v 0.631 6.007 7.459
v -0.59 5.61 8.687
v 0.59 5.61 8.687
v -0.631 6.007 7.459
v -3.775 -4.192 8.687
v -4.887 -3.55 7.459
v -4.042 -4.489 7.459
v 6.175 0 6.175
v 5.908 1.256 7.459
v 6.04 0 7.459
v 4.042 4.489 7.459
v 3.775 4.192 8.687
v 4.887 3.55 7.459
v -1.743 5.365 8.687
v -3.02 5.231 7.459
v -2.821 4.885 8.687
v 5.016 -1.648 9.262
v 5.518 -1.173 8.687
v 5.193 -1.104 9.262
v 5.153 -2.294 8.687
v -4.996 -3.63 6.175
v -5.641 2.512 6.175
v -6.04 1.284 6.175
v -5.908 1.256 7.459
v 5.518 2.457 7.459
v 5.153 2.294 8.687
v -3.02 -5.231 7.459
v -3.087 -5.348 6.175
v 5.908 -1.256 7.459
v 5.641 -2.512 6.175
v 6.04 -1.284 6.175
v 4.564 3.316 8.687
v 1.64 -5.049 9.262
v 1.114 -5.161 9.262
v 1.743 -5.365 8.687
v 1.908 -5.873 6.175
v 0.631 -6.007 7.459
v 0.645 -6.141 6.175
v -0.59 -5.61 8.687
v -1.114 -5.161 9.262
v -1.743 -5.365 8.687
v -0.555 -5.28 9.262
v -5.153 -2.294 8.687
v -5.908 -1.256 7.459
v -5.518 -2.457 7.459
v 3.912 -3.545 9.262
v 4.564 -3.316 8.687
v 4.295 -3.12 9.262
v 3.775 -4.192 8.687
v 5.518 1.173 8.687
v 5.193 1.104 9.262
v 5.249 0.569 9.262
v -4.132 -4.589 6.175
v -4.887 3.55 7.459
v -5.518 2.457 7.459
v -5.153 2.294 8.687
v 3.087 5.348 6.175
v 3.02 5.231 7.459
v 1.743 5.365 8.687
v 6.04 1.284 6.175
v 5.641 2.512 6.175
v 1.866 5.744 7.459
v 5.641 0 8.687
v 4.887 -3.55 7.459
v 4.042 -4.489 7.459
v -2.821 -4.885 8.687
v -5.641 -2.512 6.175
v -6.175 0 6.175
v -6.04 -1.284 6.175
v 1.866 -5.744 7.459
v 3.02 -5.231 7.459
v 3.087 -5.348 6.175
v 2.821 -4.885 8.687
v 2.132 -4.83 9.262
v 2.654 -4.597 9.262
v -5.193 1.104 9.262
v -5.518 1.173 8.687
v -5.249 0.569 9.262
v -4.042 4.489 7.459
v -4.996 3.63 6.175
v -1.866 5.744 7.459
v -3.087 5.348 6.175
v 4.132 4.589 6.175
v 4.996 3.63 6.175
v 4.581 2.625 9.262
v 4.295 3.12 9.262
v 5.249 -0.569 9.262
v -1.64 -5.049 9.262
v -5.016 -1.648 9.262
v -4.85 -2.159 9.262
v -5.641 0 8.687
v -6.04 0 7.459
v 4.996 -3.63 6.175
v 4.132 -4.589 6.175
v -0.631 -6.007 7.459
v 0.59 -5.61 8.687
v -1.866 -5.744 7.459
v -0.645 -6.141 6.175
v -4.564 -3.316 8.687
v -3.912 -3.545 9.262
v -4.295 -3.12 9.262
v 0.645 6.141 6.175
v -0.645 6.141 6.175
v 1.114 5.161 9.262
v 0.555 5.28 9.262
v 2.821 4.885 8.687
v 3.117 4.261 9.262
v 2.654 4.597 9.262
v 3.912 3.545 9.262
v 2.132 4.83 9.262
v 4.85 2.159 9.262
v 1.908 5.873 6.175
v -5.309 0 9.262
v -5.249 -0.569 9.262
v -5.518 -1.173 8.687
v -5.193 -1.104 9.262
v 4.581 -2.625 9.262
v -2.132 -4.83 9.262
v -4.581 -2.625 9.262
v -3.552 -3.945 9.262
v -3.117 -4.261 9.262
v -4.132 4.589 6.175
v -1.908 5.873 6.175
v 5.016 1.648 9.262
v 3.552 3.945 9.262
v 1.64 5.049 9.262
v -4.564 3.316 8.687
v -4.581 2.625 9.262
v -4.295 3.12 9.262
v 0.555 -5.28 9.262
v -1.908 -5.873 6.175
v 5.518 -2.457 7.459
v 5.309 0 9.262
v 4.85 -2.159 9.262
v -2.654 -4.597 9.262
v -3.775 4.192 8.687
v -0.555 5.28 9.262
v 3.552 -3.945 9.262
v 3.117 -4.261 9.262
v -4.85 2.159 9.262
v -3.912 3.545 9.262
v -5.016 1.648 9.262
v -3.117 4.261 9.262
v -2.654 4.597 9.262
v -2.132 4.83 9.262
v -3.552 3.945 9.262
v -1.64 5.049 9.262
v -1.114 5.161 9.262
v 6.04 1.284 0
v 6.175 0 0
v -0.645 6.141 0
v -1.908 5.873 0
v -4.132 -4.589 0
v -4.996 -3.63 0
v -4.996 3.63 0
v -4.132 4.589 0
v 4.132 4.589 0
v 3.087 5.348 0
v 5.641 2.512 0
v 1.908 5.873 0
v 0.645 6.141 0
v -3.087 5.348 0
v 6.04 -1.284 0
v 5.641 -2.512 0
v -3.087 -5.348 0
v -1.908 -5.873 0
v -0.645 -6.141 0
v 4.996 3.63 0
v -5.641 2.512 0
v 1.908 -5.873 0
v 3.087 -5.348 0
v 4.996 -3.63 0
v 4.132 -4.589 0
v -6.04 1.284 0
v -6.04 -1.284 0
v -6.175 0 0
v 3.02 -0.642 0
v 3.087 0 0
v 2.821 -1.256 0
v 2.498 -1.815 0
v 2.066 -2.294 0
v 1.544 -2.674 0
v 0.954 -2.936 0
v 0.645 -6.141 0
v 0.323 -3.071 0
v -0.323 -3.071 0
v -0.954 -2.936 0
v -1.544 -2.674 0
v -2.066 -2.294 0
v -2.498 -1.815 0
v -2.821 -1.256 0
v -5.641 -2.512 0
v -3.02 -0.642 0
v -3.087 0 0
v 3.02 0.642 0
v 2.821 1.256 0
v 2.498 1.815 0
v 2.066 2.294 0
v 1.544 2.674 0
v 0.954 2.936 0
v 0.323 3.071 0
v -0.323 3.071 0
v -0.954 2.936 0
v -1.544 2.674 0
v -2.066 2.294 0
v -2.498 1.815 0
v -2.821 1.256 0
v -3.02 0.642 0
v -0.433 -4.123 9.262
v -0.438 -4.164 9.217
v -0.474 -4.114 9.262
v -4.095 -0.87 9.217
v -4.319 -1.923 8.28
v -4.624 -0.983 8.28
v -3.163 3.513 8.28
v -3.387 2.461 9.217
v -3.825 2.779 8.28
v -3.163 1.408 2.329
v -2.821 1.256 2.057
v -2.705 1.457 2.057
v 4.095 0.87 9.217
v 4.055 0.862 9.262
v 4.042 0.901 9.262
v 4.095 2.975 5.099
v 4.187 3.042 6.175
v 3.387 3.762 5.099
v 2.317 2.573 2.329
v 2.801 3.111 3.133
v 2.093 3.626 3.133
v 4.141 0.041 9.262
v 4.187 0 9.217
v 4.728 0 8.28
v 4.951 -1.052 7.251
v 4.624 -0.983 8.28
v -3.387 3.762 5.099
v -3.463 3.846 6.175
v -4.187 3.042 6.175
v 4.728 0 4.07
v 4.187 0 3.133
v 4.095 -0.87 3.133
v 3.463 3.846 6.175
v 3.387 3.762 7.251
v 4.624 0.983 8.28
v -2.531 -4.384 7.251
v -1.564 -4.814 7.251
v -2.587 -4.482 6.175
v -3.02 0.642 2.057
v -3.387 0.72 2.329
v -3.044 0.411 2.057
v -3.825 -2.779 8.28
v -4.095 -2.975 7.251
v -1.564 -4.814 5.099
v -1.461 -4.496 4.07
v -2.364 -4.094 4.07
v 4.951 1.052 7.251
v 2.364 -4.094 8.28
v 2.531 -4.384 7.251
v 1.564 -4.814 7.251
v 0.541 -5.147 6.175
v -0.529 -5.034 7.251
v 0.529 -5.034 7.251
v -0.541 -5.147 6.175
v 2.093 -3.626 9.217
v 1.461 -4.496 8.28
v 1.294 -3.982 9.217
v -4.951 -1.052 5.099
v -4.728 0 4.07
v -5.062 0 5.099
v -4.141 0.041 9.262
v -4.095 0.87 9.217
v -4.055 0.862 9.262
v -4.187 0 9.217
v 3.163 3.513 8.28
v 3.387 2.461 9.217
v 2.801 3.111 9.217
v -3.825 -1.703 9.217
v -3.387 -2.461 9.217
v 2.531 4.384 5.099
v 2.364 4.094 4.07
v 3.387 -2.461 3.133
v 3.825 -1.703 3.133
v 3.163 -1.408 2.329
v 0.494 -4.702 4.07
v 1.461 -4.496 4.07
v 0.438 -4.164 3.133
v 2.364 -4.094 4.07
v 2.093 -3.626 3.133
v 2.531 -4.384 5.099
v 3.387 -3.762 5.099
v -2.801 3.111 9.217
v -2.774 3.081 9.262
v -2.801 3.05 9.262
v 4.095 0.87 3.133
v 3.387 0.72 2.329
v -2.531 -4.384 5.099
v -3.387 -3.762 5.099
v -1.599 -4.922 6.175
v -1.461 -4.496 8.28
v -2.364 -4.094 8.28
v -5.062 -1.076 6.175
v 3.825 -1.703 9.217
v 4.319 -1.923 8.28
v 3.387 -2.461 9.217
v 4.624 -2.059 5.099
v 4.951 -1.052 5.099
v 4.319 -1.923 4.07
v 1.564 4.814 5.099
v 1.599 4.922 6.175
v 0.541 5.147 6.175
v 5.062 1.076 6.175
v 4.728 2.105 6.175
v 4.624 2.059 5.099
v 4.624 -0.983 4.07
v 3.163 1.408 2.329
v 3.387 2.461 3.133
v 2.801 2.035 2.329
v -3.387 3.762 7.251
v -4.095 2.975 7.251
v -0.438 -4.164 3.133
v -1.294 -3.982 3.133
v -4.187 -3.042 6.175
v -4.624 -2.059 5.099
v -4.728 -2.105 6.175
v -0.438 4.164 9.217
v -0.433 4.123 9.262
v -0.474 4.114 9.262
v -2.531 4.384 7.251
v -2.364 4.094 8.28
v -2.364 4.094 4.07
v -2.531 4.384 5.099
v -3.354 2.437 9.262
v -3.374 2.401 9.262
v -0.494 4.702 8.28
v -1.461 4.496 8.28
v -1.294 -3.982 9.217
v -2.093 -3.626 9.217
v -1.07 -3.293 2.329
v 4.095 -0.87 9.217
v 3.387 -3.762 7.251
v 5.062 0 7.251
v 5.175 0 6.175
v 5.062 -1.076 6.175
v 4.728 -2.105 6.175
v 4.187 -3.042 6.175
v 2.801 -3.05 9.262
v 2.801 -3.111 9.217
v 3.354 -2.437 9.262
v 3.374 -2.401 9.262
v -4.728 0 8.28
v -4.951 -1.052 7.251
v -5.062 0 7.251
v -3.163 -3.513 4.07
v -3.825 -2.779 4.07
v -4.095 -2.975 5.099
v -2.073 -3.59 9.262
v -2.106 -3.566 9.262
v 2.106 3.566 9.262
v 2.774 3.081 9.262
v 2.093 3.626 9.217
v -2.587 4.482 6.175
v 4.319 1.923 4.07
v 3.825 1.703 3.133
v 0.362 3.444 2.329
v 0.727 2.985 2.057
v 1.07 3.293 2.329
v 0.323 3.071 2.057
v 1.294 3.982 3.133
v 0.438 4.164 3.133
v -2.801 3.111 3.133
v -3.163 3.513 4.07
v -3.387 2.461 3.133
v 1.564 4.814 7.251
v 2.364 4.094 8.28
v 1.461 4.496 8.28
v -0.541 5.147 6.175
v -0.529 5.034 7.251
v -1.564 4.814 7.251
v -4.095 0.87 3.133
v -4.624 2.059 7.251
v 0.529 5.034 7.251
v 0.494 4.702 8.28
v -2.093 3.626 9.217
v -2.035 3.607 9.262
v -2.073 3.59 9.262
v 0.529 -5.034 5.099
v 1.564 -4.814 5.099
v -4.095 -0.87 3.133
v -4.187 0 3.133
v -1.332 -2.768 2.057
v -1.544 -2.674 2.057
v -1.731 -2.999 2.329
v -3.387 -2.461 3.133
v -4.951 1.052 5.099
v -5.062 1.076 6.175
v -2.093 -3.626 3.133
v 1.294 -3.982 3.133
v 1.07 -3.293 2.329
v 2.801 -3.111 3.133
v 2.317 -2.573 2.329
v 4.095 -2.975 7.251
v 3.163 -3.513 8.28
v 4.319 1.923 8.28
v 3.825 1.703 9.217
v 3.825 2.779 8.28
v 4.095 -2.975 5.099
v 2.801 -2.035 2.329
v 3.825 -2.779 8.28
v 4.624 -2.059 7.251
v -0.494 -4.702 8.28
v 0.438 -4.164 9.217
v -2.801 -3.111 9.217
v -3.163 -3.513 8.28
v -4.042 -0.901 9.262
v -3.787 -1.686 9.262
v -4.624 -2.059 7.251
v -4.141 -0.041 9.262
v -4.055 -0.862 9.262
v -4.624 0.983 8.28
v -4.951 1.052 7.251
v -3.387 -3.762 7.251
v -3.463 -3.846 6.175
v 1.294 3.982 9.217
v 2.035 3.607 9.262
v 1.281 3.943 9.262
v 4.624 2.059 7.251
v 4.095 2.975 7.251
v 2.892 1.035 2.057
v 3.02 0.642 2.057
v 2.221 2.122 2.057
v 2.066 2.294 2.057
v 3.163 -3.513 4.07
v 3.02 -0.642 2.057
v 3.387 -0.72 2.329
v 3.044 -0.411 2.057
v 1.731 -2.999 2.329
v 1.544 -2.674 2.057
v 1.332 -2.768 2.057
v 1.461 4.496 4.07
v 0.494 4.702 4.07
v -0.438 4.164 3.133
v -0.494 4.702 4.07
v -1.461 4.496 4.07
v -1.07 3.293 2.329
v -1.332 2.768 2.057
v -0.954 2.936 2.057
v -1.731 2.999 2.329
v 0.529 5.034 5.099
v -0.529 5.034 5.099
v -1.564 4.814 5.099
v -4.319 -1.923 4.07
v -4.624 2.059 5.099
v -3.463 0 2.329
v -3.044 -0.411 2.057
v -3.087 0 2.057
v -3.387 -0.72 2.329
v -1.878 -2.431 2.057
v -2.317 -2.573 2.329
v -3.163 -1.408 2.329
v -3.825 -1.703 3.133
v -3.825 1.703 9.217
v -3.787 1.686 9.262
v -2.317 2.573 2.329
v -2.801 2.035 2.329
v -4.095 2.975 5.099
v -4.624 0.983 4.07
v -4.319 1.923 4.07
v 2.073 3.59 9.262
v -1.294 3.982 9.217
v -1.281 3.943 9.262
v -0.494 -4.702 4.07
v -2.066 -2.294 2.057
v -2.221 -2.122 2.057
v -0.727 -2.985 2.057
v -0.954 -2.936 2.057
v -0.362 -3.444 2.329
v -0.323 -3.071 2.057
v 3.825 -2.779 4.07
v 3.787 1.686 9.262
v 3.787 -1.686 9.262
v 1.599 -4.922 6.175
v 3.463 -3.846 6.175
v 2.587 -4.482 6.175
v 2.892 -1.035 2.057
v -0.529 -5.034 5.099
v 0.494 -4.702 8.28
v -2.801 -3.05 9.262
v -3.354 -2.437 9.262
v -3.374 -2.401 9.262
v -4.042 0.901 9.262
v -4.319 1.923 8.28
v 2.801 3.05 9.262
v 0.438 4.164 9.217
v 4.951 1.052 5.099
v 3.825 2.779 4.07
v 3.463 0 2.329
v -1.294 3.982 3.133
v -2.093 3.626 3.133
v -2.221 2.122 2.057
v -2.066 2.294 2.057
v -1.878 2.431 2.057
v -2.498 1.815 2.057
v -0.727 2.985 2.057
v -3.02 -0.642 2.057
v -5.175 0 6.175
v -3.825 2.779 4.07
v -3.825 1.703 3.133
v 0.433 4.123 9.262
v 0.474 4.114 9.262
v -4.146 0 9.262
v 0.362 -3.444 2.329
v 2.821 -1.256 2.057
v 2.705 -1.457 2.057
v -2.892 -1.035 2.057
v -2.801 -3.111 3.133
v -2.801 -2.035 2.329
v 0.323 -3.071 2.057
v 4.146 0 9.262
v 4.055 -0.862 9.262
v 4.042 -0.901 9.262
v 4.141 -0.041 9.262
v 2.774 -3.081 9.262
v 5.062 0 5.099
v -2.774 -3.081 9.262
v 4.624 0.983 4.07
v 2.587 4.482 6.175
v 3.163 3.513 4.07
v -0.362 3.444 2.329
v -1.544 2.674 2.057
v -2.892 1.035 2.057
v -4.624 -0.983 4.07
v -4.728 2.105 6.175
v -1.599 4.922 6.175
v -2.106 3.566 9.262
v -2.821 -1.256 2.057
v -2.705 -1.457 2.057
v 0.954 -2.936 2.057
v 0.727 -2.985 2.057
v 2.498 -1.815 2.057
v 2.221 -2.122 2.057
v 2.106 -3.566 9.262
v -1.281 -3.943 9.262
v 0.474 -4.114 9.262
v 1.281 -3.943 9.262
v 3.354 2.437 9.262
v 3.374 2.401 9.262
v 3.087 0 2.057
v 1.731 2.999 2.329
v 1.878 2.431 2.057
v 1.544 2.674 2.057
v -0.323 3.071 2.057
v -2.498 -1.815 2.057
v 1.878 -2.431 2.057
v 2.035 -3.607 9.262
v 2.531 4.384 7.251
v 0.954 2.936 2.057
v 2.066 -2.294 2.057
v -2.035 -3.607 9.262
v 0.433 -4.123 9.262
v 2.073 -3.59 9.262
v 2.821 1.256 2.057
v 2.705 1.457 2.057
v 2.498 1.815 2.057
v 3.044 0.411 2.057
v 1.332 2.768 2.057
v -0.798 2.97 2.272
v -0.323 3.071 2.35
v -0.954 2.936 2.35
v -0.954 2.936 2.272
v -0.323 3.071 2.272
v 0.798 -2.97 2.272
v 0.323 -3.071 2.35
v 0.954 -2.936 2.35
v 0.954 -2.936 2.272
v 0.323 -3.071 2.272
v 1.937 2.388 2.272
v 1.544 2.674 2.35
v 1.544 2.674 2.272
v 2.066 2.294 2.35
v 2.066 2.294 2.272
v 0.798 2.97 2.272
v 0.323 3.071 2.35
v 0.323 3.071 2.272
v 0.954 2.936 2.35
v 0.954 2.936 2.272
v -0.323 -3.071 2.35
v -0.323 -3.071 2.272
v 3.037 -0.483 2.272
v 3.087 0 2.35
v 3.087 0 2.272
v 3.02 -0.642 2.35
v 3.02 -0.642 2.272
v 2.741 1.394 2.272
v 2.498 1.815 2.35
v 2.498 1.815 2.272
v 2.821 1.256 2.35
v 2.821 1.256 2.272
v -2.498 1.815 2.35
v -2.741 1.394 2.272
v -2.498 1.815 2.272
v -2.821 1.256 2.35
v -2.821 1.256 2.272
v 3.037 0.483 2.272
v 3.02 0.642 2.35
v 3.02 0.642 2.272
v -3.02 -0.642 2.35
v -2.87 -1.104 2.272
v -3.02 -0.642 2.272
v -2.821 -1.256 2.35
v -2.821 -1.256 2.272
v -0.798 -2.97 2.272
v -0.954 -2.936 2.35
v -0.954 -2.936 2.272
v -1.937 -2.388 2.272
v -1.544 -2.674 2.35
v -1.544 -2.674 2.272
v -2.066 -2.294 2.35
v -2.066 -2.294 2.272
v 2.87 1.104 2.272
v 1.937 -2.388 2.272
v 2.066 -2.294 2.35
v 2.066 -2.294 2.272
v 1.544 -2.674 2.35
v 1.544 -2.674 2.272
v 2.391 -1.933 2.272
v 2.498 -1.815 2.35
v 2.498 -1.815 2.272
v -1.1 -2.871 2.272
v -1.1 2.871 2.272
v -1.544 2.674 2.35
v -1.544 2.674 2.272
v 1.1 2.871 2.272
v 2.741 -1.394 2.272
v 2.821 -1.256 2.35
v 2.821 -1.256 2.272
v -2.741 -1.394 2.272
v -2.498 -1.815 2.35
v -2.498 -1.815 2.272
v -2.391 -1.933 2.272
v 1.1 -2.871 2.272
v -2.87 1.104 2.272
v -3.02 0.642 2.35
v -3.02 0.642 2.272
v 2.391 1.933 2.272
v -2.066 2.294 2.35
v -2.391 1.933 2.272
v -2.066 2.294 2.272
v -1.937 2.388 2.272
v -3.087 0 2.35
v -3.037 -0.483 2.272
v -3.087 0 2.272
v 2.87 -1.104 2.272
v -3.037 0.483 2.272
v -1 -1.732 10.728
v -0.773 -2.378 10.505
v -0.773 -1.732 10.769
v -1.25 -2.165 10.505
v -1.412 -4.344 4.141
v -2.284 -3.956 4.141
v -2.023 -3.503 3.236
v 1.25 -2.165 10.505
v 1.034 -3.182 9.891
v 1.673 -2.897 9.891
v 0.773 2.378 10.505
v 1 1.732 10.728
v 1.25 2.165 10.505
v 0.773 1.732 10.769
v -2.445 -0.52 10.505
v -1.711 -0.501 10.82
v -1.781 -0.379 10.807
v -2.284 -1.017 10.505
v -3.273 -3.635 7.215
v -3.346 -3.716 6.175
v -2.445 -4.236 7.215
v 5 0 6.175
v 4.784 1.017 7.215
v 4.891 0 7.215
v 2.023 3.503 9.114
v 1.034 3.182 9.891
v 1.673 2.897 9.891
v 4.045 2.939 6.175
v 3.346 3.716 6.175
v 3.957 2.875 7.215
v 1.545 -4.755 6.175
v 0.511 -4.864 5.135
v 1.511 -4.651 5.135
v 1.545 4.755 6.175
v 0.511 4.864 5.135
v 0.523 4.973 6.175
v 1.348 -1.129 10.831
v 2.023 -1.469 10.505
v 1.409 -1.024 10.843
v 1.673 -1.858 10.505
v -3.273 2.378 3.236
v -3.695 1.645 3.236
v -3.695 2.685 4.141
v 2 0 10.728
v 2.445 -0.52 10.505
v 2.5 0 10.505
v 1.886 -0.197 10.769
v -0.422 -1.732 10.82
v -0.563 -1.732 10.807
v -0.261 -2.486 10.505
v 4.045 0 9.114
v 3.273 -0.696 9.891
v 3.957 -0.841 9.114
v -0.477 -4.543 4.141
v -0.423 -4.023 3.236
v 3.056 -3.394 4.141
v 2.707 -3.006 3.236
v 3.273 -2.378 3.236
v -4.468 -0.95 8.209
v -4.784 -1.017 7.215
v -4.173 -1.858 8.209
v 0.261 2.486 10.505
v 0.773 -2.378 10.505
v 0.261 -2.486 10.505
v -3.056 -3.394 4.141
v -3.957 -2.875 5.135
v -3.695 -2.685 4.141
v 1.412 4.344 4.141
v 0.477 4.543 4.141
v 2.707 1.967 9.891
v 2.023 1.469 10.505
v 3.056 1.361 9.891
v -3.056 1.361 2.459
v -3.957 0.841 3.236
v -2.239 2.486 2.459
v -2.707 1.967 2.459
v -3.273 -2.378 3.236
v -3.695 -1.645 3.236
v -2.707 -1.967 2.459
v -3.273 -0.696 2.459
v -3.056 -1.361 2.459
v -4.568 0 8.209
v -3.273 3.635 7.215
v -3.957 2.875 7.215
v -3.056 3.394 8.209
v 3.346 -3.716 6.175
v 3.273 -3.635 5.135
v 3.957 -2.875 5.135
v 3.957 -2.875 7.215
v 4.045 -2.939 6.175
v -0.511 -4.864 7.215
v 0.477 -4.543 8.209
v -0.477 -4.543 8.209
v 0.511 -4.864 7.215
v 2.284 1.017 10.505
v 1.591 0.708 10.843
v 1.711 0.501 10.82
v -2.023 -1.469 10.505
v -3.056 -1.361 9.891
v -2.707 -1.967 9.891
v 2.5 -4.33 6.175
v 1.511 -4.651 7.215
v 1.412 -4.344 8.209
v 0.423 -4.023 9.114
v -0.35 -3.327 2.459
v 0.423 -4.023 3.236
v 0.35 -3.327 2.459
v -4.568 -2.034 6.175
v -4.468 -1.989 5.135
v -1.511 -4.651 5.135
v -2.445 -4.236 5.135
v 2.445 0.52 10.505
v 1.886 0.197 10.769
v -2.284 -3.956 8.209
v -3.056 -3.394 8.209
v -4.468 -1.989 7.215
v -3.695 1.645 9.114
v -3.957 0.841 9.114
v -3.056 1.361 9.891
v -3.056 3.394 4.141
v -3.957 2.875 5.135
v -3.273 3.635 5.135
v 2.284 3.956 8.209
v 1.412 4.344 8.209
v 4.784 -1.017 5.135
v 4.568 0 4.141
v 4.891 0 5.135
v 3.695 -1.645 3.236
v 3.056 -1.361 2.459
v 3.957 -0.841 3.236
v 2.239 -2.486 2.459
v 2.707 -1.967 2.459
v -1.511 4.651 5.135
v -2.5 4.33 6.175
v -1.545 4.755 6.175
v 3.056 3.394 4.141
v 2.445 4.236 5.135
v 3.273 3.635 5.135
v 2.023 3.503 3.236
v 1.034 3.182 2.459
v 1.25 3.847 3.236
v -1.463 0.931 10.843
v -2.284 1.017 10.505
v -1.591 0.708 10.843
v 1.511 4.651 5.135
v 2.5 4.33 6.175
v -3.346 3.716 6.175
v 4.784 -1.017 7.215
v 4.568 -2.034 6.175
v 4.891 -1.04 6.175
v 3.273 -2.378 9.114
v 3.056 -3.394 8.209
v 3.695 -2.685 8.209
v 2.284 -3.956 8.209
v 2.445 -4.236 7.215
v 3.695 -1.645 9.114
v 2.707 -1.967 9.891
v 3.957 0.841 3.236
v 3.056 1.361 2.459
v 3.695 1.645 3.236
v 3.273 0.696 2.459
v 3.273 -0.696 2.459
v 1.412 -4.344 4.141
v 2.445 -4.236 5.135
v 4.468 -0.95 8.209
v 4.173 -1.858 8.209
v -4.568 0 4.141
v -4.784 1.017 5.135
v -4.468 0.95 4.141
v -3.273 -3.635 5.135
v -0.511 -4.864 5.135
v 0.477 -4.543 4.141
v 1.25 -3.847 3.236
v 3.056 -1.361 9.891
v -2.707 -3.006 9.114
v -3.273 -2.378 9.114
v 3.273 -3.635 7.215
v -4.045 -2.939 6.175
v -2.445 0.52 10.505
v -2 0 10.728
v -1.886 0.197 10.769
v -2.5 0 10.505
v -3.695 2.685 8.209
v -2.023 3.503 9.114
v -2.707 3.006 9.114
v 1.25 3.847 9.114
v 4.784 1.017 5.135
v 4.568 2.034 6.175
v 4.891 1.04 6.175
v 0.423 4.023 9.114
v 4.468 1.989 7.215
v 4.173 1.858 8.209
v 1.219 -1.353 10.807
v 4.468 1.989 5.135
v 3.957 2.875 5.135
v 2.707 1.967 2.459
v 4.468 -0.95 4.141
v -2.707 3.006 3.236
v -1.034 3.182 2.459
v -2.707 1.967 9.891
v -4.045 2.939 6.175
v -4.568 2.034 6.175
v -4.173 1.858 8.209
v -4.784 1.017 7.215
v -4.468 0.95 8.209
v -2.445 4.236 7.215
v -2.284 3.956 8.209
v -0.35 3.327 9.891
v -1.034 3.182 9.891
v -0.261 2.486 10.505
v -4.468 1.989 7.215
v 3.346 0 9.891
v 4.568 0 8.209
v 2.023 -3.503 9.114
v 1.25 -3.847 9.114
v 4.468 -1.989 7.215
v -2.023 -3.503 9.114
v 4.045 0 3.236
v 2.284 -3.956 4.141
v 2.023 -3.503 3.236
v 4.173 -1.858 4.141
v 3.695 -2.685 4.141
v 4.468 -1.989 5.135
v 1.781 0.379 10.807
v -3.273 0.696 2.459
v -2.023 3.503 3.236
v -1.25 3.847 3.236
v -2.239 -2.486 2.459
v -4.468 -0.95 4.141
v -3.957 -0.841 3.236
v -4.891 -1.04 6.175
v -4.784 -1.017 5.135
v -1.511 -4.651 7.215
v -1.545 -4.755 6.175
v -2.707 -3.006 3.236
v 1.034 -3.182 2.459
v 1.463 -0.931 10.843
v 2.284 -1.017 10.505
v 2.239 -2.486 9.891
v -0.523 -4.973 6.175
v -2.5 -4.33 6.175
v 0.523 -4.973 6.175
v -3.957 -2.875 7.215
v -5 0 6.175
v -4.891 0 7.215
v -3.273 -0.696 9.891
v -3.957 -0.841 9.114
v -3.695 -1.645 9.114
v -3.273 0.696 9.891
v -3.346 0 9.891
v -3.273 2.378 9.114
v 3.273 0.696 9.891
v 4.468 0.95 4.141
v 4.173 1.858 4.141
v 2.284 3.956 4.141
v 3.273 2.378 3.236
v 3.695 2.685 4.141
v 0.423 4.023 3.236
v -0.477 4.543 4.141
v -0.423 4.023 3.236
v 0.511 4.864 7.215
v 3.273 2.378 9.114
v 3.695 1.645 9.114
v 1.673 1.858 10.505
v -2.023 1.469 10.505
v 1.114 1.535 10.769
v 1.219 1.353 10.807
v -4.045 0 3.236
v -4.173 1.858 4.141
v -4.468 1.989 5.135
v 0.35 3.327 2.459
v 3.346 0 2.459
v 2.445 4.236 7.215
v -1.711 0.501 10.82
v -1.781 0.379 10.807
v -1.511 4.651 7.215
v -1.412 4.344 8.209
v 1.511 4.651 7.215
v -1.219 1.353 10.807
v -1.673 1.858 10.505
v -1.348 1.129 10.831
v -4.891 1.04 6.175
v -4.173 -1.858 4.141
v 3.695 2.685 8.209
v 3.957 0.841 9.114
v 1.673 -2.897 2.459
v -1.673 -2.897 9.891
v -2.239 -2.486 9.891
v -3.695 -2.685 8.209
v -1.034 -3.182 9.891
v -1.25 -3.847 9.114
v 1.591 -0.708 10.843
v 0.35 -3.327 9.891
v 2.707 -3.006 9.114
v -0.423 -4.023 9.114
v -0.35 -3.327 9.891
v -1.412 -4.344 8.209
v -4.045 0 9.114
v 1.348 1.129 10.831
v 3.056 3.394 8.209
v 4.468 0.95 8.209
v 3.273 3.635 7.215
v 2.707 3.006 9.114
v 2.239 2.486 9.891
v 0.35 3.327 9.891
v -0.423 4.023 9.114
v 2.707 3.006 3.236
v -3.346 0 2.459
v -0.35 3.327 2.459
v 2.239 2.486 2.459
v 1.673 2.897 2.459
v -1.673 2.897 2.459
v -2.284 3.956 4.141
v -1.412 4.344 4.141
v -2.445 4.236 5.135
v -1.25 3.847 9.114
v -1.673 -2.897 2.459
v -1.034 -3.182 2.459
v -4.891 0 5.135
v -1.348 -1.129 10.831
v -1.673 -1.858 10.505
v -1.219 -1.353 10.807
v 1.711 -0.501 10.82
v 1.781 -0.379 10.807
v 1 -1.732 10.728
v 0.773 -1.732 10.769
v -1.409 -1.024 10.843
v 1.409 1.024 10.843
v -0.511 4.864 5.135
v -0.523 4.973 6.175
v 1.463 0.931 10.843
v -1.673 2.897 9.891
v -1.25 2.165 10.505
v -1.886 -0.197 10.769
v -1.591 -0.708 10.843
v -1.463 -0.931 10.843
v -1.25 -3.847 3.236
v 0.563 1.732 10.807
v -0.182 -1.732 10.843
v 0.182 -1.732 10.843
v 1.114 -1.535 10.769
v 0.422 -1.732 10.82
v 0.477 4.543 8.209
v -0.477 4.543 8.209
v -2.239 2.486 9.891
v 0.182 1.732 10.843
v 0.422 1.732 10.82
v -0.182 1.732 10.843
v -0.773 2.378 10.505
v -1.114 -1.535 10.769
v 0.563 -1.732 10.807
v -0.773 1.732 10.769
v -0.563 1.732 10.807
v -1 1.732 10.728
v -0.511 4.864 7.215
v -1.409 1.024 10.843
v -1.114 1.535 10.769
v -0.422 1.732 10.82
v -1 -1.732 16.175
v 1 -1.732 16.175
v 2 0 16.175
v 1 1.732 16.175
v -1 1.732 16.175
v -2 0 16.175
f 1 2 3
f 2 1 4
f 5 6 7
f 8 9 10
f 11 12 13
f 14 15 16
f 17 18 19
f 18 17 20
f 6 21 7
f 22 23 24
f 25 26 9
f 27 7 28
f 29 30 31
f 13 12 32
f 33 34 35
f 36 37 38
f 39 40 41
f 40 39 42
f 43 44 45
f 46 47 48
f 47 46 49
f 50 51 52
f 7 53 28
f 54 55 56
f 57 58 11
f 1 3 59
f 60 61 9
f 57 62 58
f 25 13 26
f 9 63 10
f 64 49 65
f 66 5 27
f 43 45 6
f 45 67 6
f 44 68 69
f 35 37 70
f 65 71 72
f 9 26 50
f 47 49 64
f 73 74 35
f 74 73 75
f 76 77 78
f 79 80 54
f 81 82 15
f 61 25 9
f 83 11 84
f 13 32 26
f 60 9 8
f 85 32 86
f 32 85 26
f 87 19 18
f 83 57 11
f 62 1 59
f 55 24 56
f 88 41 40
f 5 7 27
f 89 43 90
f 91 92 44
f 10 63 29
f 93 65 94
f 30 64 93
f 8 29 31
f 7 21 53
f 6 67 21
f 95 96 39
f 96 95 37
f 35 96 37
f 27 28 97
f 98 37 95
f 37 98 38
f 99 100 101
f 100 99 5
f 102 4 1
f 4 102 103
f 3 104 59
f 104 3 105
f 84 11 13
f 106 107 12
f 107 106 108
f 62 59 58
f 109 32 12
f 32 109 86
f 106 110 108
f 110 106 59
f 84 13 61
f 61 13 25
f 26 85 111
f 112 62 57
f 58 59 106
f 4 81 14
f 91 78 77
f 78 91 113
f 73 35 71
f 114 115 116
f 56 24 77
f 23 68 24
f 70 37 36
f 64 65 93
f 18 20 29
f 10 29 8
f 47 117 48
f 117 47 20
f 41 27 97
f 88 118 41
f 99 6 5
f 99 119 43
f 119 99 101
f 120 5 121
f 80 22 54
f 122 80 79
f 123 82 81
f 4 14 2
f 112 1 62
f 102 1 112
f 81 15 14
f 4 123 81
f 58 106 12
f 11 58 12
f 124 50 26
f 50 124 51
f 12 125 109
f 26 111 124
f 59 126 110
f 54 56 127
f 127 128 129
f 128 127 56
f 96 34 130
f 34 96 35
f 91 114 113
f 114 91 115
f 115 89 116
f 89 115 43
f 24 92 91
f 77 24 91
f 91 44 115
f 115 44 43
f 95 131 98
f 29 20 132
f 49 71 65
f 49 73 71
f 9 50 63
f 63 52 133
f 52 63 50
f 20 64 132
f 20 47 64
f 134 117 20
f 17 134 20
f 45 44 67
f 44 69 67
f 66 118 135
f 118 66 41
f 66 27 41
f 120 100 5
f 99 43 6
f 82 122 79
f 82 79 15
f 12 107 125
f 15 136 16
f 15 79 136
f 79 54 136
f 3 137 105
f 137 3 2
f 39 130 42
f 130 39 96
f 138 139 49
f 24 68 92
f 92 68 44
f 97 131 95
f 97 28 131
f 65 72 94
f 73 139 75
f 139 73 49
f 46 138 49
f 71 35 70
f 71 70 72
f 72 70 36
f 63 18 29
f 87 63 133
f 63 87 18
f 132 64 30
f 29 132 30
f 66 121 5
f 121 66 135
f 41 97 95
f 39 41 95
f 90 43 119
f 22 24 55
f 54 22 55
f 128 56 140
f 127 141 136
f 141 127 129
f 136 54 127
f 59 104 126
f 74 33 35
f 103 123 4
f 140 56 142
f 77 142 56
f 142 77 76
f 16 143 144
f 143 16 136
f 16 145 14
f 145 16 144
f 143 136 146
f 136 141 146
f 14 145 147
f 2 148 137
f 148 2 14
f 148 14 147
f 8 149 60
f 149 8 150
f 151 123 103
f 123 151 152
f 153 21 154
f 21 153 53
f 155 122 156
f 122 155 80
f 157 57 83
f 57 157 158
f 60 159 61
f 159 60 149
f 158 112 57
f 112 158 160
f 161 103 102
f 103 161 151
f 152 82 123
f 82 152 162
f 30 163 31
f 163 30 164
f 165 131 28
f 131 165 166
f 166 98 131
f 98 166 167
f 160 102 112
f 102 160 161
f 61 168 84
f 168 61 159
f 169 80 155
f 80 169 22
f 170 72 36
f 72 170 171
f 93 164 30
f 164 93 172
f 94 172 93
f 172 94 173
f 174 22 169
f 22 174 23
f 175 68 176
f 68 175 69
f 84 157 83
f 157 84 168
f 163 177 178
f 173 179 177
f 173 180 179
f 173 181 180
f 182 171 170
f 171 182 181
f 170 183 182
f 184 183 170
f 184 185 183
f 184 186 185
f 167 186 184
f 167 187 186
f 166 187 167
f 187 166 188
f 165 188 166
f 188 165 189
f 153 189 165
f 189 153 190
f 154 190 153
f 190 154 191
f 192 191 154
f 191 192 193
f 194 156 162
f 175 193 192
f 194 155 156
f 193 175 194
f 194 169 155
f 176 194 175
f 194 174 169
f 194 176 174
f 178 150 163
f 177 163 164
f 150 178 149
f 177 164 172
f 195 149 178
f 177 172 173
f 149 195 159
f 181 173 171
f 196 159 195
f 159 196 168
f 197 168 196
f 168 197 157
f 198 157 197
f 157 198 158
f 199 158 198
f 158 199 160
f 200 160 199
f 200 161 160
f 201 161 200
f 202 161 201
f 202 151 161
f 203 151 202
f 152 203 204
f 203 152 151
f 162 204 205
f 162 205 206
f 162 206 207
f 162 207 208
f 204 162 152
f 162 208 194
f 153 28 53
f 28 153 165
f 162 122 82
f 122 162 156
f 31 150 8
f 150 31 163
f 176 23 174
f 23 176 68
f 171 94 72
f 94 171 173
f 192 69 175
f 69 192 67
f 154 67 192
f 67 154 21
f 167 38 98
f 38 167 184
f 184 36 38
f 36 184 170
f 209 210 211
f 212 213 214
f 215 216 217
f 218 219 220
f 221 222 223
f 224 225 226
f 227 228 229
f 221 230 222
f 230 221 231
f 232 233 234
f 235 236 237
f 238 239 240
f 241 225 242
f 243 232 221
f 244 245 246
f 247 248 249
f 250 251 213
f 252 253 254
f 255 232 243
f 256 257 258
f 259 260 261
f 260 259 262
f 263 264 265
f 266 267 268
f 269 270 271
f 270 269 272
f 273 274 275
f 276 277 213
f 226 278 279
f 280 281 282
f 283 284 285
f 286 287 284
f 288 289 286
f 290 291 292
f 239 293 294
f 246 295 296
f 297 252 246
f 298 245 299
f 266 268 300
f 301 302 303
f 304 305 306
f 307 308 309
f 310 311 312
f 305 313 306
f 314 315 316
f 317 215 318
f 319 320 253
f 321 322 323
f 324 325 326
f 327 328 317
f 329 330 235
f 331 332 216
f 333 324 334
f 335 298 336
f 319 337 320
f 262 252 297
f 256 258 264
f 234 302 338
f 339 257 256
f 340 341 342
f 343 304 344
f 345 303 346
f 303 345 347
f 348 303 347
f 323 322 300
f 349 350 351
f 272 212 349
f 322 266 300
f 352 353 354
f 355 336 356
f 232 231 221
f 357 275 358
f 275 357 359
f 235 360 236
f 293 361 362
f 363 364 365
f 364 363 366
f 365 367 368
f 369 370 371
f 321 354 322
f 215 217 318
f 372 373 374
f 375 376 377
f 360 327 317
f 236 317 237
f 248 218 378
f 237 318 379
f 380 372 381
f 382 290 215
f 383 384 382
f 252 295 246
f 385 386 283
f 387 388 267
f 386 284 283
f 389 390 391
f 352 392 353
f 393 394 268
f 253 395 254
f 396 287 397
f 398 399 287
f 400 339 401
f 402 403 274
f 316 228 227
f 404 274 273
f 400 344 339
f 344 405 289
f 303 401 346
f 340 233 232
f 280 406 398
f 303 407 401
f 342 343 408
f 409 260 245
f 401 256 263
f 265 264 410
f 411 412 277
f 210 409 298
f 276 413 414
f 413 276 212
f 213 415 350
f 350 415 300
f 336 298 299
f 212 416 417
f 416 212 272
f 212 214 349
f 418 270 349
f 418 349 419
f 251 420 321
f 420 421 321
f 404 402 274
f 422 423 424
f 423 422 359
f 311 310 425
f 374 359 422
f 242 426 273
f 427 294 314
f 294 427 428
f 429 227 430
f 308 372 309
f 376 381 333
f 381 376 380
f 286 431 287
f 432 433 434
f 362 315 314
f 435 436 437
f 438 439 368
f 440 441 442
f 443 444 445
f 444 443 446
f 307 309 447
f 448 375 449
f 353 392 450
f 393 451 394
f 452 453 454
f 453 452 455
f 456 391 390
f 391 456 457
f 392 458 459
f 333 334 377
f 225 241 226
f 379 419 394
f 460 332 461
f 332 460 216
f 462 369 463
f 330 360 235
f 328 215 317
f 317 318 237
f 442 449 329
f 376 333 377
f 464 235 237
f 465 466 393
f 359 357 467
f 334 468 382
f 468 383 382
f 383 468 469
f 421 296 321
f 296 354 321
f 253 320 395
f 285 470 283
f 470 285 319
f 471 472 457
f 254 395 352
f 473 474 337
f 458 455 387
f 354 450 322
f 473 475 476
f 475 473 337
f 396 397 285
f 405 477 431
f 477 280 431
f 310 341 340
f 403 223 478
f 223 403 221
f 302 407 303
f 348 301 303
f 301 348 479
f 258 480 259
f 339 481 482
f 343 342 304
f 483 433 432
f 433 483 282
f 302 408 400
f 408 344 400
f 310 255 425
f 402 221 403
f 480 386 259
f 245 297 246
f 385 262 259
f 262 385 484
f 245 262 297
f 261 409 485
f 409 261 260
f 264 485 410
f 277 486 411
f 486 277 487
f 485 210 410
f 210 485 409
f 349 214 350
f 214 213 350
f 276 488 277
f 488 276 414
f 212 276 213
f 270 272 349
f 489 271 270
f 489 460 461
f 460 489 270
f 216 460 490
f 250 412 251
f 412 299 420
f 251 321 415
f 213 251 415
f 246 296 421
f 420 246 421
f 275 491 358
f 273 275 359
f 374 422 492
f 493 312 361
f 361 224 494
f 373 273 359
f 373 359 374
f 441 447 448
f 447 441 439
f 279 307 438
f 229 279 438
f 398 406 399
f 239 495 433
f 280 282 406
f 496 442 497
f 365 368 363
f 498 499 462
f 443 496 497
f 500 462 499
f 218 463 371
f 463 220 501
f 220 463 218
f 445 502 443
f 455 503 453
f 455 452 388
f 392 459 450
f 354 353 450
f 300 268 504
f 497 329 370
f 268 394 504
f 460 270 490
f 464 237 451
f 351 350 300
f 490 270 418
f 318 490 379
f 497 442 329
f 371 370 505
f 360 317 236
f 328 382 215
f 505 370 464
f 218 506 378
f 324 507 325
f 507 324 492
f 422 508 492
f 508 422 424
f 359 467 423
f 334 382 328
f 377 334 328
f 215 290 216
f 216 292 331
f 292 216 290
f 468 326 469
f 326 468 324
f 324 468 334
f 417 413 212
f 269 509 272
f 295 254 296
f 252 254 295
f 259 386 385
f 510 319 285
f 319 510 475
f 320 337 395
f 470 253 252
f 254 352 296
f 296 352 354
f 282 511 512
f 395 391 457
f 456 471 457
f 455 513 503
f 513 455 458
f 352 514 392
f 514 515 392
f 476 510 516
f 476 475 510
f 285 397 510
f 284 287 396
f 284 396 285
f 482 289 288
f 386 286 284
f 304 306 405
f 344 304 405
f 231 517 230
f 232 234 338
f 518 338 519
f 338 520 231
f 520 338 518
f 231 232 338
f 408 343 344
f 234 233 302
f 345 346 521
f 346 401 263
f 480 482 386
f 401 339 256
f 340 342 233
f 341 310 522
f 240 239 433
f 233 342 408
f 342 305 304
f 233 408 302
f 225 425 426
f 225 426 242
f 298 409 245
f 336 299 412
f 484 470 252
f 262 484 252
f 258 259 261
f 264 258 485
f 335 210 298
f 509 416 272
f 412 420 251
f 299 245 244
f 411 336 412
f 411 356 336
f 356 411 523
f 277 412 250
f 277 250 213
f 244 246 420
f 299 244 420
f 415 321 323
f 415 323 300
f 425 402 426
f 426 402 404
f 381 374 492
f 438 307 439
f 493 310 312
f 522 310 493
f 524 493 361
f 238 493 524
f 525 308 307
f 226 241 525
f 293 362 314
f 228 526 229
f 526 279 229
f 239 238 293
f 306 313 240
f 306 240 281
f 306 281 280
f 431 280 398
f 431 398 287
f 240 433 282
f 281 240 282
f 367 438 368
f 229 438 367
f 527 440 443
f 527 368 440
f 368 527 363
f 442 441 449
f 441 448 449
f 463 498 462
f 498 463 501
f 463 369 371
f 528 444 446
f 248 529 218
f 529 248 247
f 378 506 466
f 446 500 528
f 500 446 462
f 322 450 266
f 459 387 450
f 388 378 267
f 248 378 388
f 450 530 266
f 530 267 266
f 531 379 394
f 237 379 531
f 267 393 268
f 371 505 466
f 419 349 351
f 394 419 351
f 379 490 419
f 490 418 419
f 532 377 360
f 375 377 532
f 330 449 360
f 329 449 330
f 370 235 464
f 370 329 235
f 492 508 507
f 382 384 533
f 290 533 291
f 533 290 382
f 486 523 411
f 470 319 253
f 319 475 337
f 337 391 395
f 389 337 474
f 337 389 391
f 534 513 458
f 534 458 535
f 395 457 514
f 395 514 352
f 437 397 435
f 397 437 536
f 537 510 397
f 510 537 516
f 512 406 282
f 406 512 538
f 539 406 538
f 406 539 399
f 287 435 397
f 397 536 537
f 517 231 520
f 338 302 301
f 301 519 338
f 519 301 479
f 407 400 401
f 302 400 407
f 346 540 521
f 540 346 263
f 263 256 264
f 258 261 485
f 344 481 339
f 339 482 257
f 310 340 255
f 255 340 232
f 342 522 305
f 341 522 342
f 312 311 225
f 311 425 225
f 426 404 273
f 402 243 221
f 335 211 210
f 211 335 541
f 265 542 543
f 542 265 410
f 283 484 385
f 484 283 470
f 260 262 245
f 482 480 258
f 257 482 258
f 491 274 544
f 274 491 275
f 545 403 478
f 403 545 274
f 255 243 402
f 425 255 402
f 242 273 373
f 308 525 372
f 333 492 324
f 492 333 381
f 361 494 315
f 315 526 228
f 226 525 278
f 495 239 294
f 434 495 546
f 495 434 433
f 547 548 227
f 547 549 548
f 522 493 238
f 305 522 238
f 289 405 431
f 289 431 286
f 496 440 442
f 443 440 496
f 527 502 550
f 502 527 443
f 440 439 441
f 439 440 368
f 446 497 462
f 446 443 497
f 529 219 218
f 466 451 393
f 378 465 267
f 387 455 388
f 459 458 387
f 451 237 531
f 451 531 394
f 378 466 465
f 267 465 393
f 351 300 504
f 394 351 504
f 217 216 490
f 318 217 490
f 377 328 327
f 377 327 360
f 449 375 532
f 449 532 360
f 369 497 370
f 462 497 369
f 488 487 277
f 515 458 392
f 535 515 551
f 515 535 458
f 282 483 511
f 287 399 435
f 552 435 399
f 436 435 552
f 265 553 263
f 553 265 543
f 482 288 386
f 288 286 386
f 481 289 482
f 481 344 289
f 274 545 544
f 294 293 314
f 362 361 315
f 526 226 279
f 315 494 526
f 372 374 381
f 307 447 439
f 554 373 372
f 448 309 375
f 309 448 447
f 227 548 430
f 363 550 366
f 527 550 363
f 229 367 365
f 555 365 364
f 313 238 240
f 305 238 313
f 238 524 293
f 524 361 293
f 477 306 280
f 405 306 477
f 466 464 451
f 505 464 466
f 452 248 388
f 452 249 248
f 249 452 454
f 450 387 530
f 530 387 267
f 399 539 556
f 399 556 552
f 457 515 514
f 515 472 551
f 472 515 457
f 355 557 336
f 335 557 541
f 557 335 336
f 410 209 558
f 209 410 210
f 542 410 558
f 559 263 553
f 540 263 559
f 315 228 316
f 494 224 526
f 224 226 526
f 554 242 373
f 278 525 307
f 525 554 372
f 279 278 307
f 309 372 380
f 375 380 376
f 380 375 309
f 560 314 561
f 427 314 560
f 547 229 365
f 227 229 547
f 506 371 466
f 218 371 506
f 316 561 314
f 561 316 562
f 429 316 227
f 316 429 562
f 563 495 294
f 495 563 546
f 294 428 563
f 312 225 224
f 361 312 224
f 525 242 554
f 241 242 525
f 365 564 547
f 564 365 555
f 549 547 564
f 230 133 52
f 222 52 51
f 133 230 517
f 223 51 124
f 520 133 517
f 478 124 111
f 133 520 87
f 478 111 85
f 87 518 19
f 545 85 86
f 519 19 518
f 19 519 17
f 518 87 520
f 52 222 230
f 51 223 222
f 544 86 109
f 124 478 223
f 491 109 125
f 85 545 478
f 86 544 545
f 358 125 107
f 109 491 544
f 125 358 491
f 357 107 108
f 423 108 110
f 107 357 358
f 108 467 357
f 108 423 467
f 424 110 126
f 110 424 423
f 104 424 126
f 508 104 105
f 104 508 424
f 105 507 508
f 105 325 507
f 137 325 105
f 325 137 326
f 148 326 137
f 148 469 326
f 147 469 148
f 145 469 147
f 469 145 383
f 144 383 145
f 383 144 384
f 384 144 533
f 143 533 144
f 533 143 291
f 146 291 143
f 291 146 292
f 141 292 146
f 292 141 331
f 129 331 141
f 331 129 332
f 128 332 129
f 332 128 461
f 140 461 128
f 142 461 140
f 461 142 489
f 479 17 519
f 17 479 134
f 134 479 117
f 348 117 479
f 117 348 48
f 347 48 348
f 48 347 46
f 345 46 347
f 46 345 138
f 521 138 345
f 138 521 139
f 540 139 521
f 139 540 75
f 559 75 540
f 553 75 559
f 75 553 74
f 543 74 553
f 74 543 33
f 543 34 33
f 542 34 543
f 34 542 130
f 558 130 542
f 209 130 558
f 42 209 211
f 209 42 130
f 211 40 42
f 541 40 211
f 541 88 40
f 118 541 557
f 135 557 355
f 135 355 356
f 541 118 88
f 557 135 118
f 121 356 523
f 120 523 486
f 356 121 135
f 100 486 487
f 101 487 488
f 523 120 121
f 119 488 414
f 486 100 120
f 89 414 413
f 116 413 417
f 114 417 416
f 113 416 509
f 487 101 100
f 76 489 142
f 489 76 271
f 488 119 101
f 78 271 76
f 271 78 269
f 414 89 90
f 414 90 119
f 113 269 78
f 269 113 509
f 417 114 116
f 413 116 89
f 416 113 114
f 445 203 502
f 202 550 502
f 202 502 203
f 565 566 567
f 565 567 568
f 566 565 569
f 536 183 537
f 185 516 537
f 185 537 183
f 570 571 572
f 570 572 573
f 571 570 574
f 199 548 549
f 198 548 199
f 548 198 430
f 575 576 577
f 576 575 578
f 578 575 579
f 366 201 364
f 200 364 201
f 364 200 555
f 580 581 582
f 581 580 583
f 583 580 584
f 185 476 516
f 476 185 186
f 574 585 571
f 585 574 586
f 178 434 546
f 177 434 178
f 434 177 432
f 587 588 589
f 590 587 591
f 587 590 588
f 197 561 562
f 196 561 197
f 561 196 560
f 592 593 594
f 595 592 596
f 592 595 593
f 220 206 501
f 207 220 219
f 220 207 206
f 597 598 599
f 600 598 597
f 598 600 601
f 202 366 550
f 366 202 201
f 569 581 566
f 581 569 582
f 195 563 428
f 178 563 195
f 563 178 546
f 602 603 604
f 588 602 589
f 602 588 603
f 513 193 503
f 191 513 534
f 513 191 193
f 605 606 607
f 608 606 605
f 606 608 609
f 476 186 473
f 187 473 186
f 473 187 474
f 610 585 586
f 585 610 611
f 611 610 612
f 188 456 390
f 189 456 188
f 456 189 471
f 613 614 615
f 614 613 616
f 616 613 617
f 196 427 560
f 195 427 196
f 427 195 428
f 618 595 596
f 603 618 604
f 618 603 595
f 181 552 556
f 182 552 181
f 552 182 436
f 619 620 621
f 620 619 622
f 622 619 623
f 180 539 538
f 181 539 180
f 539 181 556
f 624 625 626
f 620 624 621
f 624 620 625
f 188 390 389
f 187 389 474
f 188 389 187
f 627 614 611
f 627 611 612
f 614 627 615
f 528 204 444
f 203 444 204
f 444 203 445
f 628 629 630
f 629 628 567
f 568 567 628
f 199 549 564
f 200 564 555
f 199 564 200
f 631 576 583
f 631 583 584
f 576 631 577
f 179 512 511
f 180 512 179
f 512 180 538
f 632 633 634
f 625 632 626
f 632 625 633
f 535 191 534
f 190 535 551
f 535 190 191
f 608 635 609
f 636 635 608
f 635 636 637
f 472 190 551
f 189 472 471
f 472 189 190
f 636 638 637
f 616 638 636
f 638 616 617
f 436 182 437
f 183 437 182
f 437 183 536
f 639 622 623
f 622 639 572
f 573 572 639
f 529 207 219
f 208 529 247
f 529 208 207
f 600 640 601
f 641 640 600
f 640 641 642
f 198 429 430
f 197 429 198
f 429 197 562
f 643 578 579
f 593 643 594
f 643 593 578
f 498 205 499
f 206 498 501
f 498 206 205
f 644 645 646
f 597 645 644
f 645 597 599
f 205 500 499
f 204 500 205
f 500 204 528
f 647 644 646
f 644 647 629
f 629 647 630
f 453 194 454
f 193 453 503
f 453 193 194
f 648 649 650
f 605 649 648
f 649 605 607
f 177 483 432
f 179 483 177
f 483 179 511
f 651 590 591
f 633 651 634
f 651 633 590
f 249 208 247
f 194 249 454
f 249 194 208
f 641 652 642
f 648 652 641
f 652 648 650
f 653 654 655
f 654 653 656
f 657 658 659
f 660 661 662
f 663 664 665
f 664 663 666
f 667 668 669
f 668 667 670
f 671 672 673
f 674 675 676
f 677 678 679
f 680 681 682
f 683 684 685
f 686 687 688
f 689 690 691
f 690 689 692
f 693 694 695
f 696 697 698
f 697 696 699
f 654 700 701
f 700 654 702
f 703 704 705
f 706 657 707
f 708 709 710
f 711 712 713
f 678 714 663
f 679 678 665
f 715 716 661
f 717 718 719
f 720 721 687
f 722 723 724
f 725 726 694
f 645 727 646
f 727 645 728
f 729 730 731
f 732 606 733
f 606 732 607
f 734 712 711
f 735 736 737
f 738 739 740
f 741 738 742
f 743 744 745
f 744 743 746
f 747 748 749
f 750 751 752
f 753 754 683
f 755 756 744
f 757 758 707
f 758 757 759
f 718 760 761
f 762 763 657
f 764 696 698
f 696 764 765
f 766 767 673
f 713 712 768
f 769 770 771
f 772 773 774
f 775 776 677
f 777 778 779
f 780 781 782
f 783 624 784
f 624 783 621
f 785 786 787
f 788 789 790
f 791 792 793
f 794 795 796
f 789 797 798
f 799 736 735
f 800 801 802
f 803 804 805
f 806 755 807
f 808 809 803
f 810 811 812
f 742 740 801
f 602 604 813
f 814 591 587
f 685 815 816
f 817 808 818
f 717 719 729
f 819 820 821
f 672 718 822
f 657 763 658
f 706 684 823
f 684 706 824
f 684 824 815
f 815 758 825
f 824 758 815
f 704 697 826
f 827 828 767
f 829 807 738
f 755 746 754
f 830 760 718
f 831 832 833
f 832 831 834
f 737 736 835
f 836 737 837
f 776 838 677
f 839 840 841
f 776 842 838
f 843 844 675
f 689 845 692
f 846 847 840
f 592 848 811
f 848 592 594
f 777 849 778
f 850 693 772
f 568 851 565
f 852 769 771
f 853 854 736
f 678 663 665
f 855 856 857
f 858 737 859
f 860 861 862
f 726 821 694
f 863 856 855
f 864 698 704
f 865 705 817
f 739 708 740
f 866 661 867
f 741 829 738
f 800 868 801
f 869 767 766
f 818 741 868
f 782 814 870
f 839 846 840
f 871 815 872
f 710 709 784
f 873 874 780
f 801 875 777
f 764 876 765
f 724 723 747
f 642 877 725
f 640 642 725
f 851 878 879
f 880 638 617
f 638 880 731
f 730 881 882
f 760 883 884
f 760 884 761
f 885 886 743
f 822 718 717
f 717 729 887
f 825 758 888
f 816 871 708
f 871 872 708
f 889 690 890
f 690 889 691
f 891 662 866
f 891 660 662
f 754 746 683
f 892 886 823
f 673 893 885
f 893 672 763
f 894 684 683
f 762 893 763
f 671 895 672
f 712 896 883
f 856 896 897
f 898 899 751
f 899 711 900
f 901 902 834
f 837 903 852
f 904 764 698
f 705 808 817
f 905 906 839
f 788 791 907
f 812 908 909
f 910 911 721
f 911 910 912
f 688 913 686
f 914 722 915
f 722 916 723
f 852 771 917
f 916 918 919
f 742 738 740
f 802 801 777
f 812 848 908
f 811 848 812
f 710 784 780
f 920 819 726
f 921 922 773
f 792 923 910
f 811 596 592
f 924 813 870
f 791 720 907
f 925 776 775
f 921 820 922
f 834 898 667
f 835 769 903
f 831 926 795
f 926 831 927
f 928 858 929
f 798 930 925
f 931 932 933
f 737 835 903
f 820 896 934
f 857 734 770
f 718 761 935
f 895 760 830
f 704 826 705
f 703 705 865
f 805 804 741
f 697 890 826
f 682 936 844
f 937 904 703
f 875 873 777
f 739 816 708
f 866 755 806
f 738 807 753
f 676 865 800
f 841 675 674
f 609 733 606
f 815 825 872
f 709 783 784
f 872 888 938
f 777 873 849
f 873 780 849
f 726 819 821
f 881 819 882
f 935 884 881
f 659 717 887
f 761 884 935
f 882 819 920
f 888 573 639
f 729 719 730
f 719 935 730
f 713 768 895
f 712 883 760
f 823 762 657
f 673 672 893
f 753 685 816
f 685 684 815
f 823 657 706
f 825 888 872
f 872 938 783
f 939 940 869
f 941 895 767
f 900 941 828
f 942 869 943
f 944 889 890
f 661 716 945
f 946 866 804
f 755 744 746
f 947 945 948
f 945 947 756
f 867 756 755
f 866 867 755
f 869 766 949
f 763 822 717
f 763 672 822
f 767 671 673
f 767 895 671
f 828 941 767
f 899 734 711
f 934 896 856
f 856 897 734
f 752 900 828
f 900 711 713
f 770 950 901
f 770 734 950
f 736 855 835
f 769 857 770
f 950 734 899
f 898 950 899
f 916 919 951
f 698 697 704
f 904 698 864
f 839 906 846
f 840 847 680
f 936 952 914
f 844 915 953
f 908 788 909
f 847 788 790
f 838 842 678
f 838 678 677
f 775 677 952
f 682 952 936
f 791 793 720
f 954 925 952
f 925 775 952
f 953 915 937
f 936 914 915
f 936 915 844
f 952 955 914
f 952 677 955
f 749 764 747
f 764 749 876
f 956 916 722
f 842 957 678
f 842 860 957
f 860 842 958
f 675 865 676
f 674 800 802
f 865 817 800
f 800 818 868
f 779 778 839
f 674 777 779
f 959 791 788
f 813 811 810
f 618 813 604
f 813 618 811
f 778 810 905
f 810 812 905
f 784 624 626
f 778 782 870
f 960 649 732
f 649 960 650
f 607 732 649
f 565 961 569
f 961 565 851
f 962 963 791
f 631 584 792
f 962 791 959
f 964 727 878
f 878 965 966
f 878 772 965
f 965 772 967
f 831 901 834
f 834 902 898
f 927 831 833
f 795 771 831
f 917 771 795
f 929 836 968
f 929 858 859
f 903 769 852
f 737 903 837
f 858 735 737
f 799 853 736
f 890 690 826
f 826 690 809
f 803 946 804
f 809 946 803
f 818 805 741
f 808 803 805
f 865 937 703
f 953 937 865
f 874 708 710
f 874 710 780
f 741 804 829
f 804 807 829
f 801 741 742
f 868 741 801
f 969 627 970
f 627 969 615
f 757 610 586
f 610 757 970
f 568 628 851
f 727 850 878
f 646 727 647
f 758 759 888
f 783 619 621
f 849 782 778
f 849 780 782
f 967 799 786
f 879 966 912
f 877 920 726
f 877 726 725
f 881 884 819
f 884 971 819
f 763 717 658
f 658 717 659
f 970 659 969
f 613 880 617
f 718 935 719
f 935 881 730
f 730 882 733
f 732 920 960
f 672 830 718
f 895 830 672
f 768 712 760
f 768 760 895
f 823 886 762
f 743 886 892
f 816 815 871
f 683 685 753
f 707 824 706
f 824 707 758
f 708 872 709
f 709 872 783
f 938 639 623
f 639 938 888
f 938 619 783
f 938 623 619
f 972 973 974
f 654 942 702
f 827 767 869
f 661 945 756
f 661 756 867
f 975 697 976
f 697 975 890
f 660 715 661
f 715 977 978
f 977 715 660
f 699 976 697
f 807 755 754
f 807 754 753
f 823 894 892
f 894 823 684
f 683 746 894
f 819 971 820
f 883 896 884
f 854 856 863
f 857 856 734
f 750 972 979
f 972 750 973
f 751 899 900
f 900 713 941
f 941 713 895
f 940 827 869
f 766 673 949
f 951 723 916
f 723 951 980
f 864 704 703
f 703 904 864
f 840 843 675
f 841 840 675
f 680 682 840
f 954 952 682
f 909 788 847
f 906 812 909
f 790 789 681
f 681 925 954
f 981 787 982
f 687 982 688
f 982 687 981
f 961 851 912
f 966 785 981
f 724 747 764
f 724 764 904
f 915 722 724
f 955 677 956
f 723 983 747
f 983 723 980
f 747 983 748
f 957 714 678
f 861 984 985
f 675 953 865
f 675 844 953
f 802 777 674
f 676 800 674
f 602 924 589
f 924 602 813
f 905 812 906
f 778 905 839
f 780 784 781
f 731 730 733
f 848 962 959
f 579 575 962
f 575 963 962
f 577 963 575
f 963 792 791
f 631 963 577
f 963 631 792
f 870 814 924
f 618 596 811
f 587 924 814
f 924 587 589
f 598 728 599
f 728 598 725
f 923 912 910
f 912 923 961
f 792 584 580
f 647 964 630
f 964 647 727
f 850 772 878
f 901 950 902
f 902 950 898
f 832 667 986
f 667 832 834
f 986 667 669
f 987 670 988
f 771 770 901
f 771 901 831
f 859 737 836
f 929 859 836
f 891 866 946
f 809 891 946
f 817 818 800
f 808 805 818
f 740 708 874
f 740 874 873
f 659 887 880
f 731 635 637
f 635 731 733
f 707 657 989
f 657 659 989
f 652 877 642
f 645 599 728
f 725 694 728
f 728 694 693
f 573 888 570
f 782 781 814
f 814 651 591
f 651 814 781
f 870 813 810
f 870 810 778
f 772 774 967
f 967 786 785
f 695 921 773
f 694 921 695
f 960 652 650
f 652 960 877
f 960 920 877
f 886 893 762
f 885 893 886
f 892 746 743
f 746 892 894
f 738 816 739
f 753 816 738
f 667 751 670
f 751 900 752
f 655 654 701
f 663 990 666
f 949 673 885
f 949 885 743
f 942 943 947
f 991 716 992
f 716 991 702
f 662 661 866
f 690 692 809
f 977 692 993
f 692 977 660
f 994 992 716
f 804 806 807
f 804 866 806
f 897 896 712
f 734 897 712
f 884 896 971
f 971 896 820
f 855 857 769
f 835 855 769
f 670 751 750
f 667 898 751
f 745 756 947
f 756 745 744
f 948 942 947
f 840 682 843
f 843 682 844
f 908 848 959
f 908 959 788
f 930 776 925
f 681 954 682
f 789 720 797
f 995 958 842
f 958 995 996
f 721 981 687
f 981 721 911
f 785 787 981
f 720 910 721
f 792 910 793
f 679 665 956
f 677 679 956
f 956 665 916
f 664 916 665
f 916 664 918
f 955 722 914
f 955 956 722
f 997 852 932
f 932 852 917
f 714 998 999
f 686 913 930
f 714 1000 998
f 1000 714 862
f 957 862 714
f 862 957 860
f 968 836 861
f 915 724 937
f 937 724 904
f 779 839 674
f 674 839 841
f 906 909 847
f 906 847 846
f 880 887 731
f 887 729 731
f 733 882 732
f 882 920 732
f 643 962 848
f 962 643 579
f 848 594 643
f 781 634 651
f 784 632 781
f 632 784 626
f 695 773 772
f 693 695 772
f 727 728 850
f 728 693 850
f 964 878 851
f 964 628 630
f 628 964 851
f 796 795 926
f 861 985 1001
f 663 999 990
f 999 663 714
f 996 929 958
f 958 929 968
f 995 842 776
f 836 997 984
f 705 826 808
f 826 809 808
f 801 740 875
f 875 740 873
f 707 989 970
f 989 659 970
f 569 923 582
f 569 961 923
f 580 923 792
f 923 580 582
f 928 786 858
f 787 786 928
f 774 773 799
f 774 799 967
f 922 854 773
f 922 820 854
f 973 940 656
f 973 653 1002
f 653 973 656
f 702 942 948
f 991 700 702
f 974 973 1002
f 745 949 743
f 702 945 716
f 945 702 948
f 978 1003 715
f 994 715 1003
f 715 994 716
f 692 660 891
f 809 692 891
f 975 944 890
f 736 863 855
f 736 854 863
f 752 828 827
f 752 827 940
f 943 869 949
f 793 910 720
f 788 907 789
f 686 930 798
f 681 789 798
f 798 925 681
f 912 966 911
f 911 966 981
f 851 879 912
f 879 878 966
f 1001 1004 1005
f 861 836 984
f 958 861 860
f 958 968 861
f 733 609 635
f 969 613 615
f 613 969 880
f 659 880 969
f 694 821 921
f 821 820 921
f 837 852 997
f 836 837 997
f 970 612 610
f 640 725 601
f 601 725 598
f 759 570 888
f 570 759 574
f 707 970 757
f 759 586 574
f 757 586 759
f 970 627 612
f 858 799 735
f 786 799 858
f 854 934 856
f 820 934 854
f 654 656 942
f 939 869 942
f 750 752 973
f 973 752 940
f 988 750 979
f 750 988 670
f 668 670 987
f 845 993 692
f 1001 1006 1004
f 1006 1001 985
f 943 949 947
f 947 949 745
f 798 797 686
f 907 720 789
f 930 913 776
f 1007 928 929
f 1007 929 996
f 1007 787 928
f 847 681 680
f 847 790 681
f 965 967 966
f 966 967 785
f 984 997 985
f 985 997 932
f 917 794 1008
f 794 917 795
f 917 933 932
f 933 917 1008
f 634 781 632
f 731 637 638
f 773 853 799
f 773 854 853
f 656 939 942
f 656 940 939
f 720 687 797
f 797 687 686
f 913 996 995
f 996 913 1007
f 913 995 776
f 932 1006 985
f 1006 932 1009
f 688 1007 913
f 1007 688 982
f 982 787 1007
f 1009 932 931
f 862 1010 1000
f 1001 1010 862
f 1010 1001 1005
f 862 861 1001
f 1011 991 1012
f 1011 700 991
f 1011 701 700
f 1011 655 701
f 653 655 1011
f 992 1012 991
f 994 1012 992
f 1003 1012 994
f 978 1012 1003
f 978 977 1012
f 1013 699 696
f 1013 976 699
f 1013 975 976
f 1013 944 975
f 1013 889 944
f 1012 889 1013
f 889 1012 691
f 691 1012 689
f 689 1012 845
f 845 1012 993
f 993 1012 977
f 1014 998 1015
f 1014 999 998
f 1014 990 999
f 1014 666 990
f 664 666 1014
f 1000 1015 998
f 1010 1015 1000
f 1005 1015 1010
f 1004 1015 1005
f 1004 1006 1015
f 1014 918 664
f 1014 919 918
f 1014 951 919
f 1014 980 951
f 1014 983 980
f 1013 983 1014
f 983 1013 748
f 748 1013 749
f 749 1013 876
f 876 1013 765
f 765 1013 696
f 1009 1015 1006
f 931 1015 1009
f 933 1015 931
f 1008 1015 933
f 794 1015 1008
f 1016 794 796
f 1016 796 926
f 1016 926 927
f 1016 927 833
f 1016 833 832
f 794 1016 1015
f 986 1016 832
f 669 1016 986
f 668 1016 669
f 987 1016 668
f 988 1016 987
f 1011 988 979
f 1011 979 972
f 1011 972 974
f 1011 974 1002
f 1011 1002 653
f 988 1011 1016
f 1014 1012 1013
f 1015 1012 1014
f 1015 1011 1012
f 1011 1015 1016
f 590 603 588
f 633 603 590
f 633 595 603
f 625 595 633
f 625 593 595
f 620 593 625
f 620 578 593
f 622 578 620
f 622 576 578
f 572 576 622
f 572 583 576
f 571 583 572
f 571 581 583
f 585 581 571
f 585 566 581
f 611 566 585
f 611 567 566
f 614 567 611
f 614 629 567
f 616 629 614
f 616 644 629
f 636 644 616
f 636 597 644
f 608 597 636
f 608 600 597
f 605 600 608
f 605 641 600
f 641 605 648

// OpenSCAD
module ball_joint(d, th, gap) {
    od = d+gap+th;
    translate([0,0,od/2]) difference() {
        union() {
            difference() {
                union() {
                    sphere(d=od);
                    mirror([0,0,1]) cylinder(d=od, h=od/2);
                }
                sphere(d=d+gap);
                translate([0,0,od*0.25]) 
                    linear_extrude(h=od) square([od,od], center=true);
                translate([0,0,-od/2]) cylinder(d=od/2, h=od/2);
            }
            
            sphere(d=d);
            cylinder(d=d*0.4, h=d, $fn=6);
        }
        translate([0,0,-od/2]) cylinder(d=od/2, h=gap+th);
    }
    
}

$fn=30;
ball_joint(10, 2, 0.35);

// loose: ball bottom, gap=0.5
